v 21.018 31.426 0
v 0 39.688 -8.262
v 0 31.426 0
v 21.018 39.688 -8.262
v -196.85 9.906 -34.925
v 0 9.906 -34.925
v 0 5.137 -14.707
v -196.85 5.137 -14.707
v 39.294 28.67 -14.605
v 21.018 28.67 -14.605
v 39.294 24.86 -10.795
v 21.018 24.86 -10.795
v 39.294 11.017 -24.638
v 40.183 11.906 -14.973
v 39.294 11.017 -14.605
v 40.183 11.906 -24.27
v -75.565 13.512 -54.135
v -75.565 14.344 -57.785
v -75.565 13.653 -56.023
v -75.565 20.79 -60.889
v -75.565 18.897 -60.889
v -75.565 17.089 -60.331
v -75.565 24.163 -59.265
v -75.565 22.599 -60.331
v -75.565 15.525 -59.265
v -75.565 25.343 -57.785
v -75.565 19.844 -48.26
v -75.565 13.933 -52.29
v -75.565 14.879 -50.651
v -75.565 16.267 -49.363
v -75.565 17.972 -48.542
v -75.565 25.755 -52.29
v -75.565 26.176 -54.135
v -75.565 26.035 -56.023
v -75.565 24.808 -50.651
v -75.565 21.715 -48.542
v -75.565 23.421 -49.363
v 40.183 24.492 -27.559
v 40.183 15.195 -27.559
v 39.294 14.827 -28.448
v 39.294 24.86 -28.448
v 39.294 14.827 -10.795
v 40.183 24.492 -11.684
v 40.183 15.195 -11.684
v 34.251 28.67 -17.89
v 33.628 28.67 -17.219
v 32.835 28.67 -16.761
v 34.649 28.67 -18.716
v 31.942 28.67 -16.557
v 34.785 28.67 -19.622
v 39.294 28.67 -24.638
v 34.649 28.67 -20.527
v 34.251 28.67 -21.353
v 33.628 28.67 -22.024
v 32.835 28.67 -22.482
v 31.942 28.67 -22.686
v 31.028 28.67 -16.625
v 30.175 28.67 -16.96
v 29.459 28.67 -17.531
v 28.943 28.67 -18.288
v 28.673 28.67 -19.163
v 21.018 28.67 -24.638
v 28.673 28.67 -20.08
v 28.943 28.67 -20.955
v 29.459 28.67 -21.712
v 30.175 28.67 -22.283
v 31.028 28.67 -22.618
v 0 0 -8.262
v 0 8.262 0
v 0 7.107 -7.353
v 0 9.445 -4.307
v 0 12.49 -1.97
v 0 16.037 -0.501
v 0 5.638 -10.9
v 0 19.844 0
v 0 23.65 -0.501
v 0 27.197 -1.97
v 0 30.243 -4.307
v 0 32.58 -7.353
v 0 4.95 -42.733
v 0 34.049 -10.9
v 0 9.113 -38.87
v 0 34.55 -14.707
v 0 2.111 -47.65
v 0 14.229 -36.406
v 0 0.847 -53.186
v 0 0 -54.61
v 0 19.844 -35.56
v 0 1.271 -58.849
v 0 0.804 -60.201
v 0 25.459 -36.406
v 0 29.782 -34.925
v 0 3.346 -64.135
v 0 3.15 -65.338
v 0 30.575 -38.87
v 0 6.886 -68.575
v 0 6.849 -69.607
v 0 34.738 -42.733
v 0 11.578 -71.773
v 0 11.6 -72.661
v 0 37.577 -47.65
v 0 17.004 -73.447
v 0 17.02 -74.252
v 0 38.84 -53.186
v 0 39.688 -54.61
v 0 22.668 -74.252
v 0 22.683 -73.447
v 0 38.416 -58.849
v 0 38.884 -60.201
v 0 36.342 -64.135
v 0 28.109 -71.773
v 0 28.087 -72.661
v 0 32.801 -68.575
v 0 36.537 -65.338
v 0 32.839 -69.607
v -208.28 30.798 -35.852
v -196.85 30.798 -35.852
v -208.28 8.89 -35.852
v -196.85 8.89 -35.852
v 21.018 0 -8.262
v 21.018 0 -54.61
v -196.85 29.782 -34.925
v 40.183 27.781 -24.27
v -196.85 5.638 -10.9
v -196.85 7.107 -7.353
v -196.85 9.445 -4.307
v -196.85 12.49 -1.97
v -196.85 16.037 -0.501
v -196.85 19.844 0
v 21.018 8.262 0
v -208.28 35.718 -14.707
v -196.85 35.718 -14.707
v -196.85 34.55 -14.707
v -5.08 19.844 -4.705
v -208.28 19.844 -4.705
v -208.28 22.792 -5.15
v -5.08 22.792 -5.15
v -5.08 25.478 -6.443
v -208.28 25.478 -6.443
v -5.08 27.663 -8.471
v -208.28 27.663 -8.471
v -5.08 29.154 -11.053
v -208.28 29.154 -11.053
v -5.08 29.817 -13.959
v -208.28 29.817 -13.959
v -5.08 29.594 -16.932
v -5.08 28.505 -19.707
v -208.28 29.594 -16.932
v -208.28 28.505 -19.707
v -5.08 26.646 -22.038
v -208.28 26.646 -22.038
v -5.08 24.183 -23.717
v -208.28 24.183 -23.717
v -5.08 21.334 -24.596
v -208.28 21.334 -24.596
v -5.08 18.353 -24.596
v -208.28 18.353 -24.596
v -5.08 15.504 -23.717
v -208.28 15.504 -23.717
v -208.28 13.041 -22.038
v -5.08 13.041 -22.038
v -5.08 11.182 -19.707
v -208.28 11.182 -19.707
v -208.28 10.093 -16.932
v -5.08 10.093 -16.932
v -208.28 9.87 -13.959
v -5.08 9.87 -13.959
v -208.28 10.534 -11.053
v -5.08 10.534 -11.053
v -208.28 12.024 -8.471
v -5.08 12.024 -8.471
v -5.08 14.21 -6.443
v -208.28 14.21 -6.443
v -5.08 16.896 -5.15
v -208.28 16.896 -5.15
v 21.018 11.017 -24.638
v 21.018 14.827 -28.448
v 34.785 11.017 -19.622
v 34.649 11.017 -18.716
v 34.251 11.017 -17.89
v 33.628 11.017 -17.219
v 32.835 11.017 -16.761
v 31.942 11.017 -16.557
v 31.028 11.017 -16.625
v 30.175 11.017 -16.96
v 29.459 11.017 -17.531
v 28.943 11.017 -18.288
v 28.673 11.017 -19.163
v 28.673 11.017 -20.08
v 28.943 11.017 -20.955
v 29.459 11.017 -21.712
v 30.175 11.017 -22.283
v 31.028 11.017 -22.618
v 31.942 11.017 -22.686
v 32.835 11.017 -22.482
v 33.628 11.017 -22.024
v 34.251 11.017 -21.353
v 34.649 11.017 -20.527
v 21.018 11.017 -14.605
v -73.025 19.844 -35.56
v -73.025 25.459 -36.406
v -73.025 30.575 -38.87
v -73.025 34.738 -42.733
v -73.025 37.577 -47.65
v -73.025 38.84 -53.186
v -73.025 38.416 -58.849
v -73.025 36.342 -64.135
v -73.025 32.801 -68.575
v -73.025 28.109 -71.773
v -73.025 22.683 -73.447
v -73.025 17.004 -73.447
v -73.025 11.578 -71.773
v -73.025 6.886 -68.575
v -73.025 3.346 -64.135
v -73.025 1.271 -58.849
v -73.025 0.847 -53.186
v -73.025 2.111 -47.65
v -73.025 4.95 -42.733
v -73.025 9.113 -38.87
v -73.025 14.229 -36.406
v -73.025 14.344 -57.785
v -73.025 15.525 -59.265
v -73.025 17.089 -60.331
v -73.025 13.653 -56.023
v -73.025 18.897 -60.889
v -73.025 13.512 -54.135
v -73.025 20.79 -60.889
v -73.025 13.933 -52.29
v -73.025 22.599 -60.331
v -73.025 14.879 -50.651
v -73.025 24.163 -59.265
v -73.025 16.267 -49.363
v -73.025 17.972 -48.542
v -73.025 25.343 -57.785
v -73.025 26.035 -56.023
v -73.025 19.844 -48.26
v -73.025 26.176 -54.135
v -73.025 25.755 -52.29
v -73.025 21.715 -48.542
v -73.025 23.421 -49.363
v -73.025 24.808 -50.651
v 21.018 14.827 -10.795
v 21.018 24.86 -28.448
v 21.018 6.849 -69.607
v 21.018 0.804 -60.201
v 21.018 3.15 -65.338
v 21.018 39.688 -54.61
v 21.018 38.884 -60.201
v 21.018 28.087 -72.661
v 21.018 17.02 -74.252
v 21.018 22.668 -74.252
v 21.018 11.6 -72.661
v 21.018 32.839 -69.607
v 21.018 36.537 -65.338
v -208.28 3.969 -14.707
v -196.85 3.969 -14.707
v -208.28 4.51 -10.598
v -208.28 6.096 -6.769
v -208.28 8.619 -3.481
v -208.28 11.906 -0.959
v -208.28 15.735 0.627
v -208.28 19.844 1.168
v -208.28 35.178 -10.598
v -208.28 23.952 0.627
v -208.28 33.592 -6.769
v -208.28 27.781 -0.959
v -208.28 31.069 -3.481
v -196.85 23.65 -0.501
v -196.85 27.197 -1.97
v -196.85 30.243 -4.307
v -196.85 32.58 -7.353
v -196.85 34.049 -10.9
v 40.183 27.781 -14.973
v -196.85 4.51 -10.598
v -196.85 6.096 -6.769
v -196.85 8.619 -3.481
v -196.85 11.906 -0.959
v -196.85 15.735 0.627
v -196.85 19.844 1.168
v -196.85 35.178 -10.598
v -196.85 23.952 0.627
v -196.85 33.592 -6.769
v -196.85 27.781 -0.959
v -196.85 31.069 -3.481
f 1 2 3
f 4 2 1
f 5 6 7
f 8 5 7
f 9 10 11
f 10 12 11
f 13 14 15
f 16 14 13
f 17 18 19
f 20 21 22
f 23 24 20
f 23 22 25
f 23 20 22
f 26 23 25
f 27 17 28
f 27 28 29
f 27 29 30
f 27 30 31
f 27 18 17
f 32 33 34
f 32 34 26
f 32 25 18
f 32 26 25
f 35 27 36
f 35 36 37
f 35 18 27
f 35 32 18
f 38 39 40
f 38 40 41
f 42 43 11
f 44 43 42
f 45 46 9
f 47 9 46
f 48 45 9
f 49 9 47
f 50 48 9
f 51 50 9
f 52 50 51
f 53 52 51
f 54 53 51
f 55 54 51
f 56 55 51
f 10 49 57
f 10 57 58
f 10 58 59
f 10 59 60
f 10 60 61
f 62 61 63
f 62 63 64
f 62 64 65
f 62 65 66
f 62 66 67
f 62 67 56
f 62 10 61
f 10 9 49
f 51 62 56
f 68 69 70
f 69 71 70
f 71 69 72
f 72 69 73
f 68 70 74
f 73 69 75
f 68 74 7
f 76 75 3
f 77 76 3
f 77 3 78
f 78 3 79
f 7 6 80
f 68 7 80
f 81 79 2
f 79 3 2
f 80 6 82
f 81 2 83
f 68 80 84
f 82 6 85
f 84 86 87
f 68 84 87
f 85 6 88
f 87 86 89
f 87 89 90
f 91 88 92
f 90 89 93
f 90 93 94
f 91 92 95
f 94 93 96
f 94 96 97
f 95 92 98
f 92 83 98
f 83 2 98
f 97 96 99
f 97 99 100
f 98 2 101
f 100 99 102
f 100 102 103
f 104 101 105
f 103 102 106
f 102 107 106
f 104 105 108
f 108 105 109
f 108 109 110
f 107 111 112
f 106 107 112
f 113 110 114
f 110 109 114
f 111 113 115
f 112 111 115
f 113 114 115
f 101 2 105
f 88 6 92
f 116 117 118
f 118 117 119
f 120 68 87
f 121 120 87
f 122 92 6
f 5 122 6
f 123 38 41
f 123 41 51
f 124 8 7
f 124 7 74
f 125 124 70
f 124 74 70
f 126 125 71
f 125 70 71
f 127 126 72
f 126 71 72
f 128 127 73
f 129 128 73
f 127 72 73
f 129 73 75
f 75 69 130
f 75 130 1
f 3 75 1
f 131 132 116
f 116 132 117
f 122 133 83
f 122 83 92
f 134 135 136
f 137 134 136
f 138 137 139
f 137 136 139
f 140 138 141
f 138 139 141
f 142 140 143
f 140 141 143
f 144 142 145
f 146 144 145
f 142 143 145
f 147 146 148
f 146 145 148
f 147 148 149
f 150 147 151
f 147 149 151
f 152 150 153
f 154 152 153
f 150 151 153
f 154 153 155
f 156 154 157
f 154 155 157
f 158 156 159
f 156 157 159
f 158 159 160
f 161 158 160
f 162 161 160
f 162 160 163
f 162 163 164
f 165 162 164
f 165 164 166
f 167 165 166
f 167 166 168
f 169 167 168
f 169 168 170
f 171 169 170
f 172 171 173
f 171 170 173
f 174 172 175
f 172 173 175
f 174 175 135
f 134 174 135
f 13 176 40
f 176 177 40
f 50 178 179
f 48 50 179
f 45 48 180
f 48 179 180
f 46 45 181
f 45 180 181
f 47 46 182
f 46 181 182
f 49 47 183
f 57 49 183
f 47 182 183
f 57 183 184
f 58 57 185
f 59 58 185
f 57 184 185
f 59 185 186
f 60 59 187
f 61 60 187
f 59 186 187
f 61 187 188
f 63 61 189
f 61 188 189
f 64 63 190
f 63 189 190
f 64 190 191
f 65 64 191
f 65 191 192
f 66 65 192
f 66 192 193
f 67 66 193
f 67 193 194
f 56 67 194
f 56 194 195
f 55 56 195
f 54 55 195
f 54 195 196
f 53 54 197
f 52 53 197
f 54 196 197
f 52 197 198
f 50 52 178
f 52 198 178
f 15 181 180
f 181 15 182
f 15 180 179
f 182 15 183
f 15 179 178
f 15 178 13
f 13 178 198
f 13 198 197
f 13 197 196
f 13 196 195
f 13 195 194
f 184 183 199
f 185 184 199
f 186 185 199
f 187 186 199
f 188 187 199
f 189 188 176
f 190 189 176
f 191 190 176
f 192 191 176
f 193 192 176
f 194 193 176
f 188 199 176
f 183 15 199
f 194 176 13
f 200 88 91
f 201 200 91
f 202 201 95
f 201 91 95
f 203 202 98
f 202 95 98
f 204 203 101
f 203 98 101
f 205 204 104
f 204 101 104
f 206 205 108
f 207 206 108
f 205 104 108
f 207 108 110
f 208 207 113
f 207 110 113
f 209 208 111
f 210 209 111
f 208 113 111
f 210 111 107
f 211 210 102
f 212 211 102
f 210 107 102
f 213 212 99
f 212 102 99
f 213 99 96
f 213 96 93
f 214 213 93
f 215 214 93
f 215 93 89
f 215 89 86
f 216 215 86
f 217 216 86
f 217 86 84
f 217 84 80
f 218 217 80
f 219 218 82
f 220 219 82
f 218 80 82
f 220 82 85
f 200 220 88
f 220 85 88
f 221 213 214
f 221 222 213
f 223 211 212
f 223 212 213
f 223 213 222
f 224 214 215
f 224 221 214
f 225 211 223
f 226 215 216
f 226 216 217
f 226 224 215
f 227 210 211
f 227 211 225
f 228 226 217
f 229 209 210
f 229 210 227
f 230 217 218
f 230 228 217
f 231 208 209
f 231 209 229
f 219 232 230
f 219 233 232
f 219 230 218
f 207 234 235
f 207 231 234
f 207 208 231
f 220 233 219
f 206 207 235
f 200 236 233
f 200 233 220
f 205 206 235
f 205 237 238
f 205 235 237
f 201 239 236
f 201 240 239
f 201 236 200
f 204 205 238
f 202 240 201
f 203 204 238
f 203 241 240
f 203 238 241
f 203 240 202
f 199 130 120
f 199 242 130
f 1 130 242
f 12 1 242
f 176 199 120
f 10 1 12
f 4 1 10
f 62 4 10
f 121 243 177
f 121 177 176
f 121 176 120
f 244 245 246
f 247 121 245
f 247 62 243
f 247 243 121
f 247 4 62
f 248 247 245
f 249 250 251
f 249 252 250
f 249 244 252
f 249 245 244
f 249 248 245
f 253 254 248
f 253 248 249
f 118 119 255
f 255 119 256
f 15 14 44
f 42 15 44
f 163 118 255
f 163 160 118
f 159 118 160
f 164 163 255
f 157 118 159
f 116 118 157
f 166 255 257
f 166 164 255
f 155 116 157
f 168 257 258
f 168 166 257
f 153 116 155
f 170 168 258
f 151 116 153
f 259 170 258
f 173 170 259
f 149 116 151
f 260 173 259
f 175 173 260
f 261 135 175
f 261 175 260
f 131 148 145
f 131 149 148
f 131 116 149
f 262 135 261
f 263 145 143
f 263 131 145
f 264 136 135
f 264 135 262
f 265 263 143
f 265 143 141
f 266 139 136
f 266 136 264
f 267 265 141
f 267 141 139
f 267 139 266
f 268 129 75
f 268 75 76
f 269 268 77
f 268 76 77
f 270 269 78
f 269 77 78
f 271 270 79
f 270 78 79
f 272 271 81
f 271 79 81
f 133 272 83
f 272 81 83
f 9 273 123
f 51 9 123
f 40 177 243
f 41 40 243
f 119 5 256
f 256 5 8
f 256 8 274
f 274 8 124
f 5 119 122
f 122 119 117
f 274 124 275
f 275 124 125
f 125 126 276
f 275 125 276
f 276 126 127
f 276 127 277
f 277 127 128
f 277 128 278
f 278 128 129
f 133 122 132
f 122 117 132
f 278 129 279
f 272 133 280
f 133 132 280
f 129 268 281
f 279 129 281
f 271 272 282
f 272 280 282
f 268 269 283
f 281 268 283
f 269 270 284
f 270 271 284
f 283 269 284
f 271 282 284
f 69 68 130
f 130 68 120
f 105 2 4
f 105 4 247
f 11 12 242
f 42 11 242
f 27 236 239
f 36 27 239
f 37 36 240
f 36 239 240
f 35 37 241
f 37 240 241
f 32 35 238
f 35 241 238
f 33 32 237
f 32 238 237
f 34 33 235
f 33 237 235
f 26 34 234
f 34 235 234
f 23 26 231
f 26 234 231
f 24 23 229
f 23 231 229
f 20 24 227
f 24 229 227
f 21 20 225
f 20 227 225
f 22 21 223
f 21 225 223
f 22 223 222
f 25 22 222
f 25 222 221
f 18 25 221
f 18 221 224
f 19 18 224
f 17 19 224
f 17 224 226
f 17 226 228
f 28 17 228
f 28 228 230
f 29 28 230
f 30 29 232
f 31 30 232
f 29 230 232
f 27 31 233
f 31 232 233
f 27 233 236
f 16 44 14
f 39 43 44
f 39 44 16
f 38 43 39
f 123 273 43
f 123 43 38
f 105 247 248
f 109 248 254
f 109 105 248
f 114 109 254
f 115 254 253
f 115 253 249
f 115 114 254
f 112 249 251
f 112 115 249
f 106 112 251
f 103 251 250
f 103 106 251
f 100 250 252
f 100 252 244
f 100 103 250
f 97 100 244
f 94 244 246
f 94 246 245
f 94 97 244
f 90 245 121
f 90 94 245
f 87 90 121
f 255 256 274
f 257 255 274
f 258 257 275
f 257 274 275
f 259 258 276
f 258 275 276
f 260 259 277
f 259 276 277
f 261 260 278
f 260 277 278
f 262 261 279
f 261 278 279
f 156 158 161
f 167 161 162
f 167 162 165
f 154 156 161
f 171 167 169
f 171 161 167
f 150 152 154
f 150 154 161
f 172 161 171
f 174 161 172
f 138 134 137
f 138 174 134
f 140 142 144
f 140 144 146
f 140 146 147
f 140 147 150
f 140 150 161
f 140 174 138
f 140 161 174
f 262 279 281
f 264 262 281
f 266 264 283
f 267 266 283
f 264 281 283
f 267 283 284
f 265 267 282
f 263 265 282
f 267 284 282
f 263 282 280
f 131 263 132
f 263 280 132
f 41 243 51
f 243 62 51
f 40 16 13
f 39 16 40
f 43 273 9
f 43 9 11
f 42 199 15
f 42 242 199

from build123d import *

# Parameters (mm, degrees)
SKETCH1_W           = 54.61
SKETCH1_H           = 39.6875
BOSS_EXTRUDE1_DEPTH = 21.0185
CHAMFER1_SIZE       = 8.261835623
SKETCH2_R           = 19.05
BOSS_EXTRUDE2_DEPTH = 73.025
SKETCH3_R           = 6.35
BOSS_EXTRUDE3_DEPTH = 2.54
BOSS_EXTRUDE4_DEPTH = 196.85
BOSS_EXTRUDE5_DEPTH = 11.43
SKETCH6_R           = 10.00125
CUT_EXTRUDE1_DEPTH  = 203.2
SKETCH7_W           = 17.653
SKETCH7_H           = 8.8265
BOSS_EXTRUDE6_DEPTH = 19.1643
CHAMFER2_SIZE       = 3.81
CUT_EXTRUDE2_DEPTH  = 17.653
CHAMFER3_SIZE       = 0.889


with BuildPart() as part:
    # Sketch1 → Boss-Extrude1 (new body)
    with BuildSketch(Plane(origin=(0, 0, 0), x_dir=(0, 0, -1), z_dir=(1, 0, 0))):
        with Locations((27.305, 19.84375)):
            Rectangle(SKETCH1_W, SKETCH1_H)
        with BuildLine():
            ThreePointArc((54.61, 39.6875), (74.45375, 19.84375), (54.61, 0))
            Line((54.61, 0), (54.61, 39.6875))
        make_face()
    extrude(amount=BOSS_EXTRUDE1_DEPTH)

    # Chamfer1
    chamfer1_edges = [part.edges().sort_by_distance(p)[0] for p in [
        (10.50925, 0, 0),
        (10.50925, 39.6875, 0),
    ]]
    chamfer(chamfer1_edges, length=CHAMFER1_SIZE)

    # Sketch2 → Boss-Extrude2 (add)
    with BuildSketch(Plane.ZY):
        with Locations((-54.61, 19.84375)):
            Circle(SKETCH2_R)
    extrude(amount=BOSS_EXTRUDE2_DEPTH)

    # Sketch3 → Boss-Extrude3 (add)
    with BuildSketch(Plane.ZY.offset(73.025)):
        with Locations((-54.61, 19.84375)):
            Circle(SKETCH3_R)
    extrude(amount=BOSS_EXTRUDE3_DEPTH)

    # Sketch4 → Boss-Extrude4 (add)
    with BuildSketch(Plane.ZY):
        with BuildLine():
            ThreePointArc((-14.7066, 5.13715), (-4.307463412, 9.444613412), (0, 19.84375))
            Line((0, 19.84375), (-14.7066, 19.84375))
            Line((-14.7066, 19.84375), (-34.925, 19.84375))
            Line((-34.925, 19.84375), (-34.925, 9.906))
            Line((-34.925, 9.906), (-14.7066, 5.13715))
        make_face()
        with BuildLine():
            Line((-14.7066, 19.84375), (0, 19.84375))
            ThreePointArc((0, 19.84375), (-4.307463412, 30.242886588), (-14.7066, 34.55035))
            Line((-14.7066, 34.55035), (-34.925, 29.7815))
            Line((-34.925, 29.7815), (-34.925, 19.84375))
            Line((-34.925, 19.84375), (-14.7066, 19.84375))
        make_face()
    extrude(amount=BOSS_EXTRUDE4_DEPTH)

    # Sketch5 → Boss-Extrude5 (add)
    with BuildSketch(Plane.ZY.offset(196.85)):
        with BuildLine():
            Line((-34.925, 19.84375), (0, 19.84375))
            ThreePointArc((0, 19.84375), (-4.307463412, 30.242886588), (-14.7066, 34.55035))
            Line((-14.7066, 34.55035), (-34.925, 29.7815))
            Line((-34.925, 29.7815), (-34.925, 19.84375))
        make_face()
        with BuildLine():
            Line((0, 19.84375), (1.168107566, 19.84375))
            ThreePointArc((1.168107566, 19.84375), (-3.481486631, 31.068863369), (-14.7066, 35.718457566))
            Line((-14.7066, 35.718457566), (-35.852392434, 30.7975))
            Line((-35.852392434, 30.7975), (-35.852392434, 19.84375))
            Line((-35.852392434, 19.84375), (-34.925, 19.84375))
            Line((-34.925, 19.84375), (-34.925, 29.7815))
            Line((-34.925, 29.7815), (-14.7066, 34.55035))
            ThreePointArc((-14.7066, 34.55035), (-4.307463412, 30.242886588), (0, 19.84375))
        make_face()
        with BuildLine():
            ThreePointArc((-14.7066, 5.13715), (-4.307463412, 9.444613412), (0, 19.84375))
            Line((0, 19.84375), (-34.925, 19.84375))
            Line((-34.925, 19.84375), (-34.925, 9.906))
            Line((-34.925, 9.906), (-14.7066, 5.13715))
        make_face()
        with BuildLine():
            ThreePointArc((-14.7066, 3.969042434), (-3.481486631, 8.618636631), (1.168107566, 19.84375))
            Line((1.168107566, 19.84375), (0, 19.84375))
            ThreePointArc((0, 19.84375), (-4.307463412, 9.444613412), (-14.7066, 5.13715))
            Line((-14.7066, 5.13715), (-34.925, 9.906))
            Line((-34.925, 9.906), (-34.925, 19.84375))
            Line((-34.925, 19.84375), (-35.852392434, 19.84375))
            Line((-35.852392434, 19.84375), (-35.852392434, 8.89))
            Line((-35.852392434, 8.89), (-14.7066, 3.969042434))
        make_face()
    extrude(amount=BOSS_EXTRUDE5_DEPTH)

    # Sketch6 → Cut-Extrude1 (cut)
    with BuildSketch(Plane.ZY.offset(208.28)):
        with Locations((-14.7066, 19.84375)):
            Circle(SKETCH6_R)
    extrude(amount=-CUT_EXTRUDE1_DEPTH, mode=Mode.SUBTRACT)

    # Sketch7 → Boss-Extrude6 (add)
    with BuildSketch(Plane(origin=(21.0185, 0, 0), x_dir=(0, 0, -1), z_dir=(1, 0, 0))):
        with Locations((19.6215, 15.4305)):
            Rectangle(SKETCH7_W, SKETCH7_H)
        with Locations((19.6215, 24.257)):
            Rectangle(SKETCH7_W, SKETCH7_H)
    extrude(amount=BOSS_EXTRUDE6_DEPTH)

    # Chamfer2
    chamfer2_edges = [part.edges().sort_by_distance(p)[0] for p in [
        (30.60065, 11.01725, -10.795),
        (30.60065, 11.01725, -28.448),
        (30.60065, 28.67025, -28.448),
        (30.60065, 28.67025, -10.795),
    ]]
    chamfer(chamfer2_edges, length=CHAMFER2_SIZE)

    # Sketch8 → Cut-Extrude2 (cut)
    with BuildSketch(Plane.XZ.offset(-11.01725)):
        with BuildLine():
            ThreePointArc((28.6385, -19.6215), (31.7119, -22.6949), (34.7853, -19.6215))
            Line((34.7853, -19.6215), (28.6385, -19.6215))
        make_face()
        with BuildLine():
            Line((28.6385, -19.6215), (34.7853, -19.6215))
            ThreePointArc((34.7853, -19.6215), (31.7119, -16.5481), (28.6385, -19.6215))
        make_face()
    extrude(amount=-CUT_EXTRUDE2_DEPTH, mode=Mode.SUBTRACT)

    # Chamfer3
    chamfer3_edges = [part.edges().sort_by_distance(p)[0] for p in [
        (40.1828, 19.84375, -10.795),
        (40.1828, 28.67025, -19.6215),
        (40.1828, 11.01725, -19.6215),
        (40.1828, 19.84375, -28.448),
        (40.1828, 12.92225, -12.7),
        (40.1828, 12.92225, -26.543),
        (40.1828, 26.76525, -26.543),
        (40.1828, 26.76525, -12.7),
    ]]
    chamfer(chamfer3_edges, length=CHAMFER3_SIZE)


solid = part.part
